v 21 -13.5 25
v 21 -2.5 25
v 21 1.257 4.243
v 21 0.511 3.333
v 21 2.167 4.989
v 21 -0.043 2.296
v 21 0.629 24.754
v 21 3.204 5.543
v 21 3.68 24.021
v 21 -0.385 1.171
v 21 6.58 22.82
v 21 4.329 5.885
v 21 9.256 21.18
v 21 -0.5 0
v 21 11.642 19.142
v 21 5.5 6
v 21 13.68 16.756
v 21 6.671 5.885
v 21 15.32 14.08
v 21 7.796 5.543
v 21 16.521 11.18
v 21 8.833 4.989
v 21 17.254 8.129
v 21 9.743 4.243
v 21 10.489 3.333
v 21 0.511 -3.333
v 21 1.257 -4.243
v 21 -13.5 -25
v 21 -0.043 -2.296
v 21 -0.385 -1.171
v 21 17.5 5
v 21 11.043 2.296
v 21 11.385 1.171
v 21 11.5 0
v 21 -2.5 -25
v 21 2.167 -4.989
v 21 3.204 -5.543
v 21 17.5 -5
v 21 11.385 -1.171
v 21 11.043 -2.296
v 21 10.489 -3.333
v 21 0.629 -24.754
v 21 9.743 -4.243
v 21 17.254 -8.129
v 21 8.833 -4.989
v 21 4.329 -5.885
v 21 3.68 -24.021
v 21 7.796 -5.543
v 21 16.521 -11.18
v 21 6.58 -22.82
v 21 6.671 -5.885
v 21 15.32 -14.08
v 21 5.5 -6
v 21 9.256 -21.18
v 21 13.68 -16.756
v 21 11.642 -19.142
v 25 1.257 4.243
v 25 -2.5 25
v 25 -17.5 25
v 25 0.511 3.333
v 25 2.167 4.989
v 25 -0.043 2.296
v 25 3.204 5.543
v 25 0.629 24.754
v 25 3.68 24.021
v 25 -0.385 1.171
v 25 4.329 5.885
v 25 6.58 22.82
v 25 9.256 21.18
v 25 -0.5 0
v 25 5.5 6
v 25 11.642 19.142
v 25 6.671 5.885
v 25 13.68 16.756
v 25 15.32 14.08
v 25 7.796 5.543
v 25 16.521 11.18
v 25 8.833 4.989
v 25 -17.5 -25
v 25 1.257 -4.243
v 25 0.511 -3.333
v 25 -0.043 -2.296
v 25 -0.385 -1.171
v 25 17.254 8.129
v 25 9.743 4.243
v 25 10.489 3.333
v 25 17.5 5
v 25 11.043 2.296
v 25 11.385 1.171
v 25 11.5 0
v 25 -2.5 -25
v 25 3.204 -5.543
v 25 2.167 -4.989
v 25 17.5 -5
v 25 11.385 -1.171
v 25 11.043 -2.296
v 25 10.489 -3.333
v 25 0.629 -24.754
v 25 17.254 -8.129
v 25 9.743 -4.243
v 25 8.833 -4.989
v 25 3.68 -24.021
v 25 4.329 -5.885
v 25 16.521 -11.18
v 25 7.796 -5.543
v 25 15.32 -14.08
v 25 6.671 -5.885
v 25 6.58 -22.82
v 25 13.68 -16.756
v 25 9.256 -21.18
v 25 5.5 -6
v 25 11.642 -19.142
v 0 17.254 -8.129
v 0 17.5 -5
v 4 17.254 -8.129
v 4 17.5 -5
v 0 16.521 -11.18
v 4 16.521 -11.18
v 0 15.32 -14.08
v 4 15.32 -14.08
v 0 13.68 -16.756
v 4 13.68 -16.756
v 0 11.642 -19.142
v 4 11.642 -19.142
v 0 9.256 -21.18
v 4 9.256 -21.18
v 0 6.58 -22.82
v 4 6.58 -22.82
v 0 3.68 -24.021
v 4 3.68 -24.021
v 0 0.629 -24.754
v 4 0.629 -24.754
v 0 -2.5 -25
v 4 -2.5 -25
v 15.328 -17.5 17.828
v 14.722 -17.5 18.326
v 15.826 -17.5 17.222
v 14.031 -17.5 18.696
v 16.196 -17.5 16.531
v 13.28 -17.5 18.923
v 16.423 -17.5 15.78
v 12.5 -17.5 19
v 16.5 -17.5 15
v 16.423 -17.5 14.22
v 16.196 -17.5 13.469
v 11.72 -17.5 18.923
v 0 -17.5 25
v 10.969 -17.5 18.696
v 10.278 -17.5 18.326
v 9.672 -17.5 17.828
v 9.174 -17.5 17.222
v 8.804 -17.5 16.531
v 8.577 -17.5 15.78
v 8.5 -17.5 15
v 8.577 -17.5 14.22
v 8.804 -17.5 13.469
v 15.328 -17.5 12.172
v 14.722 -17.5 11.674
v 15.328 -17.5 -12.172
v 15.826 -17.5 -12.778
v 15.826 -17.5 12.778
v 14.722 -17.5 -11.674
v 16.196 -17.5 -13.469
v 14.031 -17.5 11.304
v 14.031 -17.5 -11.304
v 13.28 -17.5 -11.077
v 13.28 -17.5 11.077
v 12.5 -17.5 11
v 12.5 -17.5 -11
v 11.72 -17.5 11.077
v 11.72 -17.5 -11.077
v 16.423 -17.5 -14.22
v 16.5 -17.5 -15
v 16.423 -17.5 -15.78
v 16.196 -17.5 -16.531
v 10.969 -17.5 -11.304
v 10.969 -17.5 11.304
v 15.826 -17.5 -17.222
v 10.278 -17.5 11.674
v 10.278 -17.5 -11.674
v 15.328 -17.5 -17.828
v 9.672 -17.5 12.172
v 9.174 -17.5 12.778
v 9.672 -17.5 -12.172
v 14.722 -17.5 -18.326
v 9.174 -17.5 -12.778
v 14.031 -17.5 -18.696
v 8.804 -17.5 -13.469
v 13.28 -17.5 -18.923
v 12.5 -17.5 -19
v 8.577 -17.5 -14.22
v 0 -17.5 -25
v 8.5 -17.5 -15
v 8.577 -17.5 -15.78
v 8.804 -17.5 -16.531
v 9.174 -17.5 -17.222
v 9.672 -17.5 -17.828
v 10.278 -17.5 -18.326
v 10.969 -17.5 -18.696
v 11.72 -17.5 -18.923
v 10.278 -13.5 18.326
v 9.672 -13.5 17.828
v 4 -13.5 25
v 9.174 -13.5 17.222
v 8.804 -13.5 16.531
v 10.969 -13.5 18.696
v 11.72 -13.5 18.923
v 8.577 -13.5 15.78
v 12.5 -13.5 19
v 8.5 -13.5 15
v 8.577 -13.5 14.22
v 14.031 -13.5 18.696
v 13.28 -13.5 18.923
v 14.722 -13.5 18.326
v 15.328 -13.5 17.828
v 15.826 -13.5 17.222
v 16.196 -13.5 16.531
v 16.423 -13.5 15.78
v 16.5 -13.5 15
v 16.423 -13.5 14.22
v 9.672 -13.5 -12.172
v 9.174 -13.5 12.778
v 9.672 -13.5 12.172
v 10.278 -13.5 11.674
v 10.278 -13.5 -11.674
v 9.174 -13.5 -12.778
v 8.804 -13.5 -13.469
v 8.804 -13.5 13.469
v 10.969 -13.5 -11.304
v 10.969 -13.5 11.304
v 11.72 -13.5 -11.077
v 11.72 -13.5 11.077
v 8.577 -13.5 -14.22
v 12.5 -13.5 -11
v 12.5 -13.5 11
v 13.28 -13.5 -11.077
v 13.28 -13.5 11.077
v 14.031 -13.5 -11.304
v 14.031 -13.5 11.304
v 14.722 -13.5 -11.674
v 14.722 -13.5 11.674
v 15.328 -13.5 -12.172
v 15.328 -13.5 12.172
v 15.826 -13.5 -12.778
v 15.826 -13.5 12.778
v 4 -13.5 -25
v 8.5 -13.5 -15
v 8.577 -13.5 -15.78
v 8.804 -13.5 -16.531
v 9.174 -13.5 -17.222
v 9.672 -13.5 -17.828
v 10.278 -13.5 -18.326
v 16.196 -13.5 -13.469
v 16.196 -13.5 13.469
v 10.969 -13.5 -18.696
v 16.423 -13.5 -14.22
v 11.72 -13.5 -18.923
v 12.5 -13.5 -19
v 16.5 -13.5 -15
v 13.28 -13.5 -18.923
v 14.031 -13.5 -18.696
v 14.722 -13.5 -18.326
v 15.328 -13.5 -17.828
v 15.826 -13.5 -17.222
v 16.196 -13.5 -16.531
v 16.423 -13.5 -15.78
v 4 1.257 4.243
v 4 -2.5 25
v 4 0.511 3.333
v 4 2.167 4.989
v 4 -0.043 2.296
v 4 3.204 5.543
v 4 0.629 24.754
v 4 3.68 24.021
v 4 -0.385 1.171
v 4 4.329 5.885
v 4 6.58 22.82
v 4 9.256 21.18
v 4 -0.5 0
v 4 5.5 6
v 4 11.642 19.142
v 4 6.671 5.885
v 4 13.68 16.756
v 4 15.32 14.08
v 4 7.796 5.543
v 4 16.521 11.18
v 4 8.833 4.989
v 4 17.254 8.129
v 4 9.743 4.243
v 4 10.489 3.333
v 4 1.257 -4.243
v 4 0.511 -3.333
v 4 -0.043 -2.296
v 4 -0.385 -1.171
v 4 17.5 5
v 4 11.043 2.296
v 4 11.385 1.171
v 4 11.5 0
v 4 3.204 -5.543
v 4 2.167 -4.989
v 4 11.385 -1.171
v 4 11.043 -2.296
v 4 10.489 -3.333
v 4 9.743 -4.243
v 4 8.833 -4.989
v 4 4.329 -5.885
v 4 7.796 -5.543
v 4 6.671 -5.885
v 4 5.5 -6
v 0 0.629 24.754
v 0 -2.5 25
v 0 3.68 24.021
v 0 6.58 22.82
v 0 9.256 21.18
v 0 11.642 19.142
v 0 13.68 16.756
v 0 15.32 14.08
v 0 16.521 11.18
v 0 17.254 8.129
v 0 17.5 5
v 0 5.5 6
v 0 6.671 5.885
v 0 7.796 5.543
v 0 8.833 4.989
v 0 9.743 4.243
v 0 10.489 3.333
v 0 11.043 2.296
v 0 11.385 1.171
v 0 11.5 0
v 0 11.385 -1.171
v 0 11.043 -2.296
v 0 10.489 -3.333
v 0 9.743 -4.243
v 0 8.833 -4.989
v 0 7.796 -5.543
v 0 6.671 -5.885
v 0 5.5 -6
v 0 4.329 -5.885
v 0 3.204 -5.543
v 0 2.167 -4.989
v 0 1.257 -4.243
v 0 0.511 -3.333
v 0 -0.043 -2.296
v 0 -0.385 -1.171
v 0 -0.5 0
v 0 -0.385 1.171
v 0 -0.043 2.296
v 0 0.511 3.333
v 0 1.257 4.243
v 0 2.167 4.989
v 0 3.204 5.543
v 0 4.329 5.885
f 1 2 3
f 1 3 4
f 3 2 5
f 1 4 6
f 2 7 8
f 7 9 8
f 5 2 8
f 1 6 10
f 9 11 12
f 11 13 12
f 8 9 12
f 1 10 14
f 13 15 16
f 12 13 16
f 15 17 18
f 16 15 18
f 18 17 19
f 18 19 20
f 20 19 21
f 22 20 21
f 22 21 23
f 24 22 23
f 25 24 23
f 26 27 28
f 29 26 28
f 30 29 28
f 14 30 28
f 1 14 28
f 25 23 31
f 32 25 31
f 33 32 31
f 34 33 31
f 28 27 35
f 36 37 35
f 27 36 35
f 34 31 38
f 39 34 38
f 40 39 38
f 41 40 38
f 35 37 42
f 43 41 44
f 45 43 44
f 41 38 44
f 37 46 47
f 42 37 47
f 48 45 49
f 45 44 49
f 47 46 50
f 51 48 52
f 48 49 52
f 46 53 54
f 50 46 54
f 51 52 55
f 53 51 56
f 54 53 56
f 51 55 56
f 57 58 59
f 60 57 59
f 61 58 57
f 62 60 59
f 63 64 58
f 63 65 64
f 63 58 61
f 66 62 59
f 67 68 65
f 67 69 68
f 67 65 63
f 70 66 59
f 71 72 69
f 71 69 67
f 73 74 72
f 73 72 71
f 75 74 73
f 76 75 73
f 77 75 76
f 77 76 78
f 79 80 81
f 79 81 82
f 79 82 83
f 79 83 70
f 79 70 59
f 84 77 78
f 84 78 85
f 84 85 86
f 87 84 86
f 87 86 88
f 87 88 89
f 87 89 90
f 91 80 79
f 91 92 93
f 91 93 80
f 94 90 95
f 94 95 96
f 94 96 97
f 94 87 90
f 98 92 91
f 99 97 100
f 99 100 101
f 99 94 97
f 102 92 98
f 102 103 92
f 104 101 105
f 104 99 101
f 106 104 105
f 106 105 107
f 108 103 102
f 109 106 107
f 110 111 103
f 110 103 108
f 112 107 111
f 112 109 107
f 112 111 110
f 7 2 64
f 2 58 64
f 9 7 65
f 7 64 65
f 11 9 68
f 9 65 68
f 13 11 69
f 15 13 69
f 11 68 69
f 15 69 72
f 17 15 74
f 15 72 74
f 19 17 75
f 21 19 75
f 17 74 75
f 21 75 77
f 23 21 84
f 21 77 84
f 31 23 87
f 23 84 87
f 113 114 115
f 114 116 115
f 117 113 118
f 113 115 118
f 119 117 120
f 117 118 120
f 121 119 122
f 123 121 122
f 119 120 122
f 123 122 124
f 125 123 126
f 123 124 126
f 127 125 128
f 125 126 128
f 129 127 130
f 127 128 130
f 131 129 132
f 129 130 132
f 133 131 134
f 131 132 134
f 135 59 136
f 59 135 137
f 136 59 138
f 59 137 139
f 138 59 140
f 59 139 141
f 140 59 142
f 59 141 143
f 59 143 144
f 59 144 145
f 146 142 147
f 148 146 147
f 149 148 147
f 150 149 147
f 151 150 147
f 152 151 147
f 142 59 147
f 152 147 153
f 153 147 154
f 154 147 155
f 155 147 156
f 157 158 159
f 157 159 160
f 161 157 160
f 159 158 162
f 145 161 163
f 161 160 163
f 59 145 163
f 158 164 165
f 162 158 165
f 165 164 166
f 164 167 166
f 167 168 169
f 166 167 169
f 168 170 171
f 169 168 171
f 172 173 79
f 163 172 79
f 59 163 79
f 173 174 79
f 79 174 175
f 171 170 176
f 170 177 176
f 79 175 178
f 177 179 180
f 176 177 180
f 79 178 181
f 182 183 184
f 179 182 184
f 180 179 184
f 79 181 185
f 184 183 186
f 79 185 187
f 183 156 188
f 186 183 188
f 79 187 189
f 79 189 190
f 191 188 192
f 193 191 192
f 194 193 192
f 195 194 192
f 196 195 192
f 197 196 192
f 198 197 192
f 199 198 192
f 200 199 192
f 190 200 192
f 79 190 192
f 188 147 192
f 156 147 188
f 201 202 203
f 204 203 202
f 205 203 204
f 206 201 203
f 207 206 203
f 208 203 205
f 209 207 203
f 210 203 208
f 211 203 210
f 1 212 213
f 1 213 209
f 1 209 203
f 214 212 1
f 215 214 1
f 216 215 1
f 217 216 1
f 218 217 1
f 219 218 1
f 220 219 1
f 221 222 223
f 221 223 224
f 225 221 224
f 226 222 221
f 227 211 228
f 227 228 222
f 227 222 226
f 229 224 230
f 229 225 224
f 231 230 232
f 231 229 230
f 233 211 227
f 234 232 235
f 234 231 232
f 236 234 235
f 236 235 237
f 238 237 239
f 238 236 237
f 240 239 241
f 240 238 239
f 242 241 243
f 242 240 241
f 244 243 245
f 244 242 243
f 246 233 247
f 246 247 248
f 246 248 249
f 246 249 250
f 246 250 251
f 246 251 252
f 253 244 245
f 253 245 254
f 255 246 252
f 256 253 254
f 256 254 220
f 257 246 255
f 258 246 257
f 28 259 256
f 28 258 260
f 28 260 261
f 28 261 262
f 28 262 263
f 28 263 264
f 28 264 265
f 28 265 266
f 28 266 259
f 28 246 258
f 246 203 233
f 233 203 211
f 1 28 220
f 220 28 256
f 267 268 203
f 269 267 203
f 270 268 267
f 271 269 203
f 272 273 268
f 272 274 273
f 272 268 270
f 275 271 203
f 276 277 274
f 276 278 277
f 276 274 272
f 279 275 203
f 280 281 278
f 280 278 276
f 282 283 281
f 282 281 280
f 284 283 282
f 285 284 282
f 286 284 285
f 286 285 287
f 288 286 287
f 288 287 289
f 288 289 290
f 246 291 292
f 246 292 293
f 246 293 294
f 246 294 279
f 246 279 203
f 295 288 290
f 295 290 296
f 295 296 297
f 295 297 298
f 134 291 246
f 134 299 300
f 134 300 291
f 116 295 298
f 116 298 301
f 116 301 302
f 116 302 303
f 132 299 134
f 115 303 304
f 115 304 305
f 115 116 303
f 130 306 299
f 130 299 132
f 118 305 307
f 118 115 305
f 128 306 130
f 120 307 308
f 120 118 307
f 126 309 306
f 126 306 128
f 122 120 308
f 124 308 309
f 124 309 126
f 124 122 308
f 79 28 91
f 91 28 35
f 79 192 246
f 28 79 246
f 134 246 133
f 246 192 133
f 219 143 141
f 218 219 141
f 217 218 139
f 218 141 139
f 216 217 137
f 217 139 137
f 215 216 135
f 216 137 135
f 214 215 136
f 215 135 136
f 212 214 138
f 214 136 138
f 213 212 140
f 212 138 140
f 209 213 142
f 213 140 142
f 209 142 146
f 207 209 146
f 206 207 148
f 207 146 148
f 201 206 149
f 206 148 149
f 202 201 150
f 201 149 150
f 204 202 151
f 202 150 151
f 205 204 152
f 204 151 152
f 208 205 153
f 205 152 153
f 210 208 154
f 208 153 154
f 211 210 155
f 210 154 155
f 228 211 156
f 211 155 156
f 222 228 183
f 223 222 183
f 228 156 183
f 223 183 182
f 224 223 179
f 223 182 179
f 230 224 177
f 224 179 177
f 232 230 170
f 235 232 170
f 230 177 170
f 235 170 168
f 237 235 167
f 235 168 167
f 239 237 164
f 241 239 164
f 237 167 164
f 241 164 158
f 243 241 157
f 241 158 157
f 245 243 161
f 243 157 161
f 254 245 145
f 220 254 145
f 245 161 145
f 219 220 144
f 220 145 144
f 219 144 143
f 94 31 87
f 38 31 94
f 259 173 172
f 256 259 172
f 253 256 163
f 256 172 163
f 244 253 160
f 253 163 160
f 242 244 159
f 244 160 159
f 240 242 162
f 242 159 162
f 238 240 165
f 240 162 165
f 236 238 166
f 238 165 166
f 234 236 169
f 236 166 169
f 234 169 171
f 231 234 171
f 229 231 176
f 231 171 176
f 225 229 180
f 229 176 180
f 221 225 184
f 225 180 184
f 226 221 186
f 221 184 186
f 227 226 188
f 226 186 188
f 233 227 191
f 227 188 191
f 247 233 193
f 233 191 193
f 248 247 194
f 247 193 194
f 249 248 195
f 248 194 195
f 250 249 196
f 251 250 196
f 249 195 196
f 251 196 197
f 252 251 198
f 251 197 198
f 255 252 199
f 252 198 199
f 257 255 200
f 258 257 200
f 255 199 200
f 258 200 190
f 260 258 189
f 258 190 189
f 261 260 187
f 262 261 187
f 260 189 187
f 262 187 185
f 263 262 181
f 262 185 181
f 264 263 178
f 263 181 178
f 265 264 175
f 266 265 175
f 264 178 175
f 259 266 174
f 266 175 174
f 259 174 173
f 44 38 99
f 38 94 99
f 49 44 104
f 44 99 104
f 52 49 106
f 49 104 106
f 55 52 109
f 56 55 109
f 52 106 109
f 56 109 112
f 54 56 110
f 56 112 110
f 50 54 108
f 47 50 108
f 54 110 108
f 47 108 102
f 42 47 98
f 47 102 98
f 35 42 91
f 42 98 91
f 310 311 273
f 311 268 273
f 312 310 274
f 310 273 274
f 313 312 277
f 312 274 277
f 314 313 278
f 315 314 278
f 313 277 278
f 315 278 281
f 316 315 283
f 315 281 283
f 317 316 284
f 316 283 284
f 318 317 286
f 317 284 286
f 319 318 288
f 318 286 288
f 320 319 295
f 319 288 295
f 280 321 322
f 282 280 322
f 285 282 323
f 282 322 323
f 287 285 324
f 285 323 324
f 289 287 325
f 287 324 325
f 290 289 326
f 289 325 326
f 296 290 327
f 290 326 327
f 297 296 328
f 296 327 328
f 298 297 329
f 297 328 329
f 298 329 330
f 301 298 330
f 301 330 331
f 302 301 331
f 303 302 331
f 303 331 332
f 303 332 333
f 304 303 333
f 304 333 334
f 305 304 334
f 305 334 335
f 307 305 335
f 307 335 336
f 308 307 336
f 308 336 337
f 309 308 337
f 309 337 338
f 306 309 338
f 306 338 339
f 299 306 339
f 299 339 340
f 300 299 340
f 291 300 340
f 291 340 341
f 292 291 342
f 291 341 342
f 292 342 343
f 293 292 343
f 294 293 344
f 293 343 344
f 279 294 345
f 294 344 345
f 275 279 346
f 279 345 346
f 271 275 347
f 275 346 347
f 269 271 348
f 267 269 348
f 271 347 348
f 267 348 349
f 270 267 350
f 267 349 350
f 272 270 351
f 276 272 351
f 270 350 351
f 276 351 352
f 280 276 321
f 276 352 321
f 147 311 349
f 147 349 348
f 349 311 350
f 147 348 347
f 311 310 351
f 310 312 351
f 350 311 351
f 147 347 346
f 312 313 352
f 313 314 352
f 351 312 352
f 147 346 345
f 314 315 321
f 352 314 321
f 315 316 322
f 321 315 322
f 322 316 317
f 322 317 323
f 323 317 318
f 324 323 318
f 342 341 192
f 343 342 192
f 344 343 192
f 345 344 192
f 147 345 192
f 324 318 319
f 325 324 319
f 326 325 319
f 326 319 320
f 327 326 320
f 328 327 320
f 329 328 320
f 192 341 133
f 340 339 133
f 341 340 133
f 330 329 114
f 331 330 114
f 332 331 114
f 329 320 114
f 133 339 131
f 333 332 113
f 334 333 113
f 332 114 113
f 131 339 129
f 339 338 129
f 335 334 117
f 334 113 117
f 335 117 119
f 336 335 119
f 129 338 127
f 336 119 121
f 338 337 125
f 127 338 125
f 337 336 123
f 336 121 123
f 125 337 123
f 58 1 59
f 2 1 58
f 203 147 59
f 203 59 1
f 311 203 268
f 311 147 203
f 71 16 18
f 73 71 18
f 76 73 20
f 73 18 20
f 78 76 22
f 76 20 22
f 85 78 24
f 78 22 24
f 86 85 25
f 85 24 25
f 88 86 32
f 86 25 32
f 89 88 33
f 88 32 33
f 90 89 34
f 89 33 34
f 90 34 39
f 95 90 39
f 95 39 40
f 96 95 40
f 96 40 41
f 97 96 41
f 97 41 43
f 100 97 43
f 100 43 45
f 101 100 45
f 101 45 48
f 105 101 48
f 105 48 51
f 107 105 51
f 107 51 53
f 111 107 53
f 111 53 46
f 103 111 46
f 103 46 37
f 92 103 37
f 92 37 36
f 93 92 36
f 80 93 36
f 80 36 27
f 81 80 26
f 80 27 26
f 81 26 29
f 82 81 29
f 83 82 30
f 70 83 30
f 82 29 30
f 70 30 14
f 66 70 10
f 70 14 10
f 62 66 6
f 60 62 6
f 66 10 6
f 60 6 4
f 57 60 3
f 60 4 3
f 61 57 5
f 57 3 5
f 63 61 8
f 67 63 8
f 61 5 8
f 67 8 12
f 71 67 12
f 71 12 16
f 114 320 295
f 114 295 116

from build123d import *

# Parameters (mm, degrees)
SKETCH1_W           = 50
SKETCH1_H           = 35
BOSS_EXTRUDE1_DEPTH = 25
SKETCH2_W           = 17
SKETCH2_H           = 50
CUT_EXTRUDE1_DEPTH  = 31
SKETCH4_R           = 6
CUT_EXTRUDE2_DEPTH  = 26
SKETCH5_R           = 4
CUT_EXTRUDE3_DEPTH  = 4
FILLET1_R           = 20


with BuildPart() as part:
    # Sketch1 → Boss-Extrude1 (new body)
    with BuildSketch(Plane(origin=(0, 0, 0), x_dir=(0, 0, -1), z_dir=(1, 0, 0))):
        Rectangle(SKETCH1_W, SKETCH1_H)
    extrude(amount=BOSS_EXTRUDE1_DEPTH)

    # Sketch2 → Cut-Extrude1 (cut)
    with BuildSketch(Plane(origin=(0, 17.5, 0), x_dir=(1, 0, 0), z_dir=(0, 1, 0))):
        with Locations((12.5, 0)):
            Rectangle(SKETCH2_W, SKETCH2_H)
    extrude(amount=-CUT_EXTRUDE1_DEPTH, mode=Mode.SUBTRACT)

    # Sketch4 → Cut-Extrude2 (cut, through all)
    with BuildSketch(Plane.ZY):
        with Locations((0, 5.5)):
            Circle(SKETCH4_R)
    extrude(amount=-CUT_EXTRUDE2_DEPTH, mode=Mode.SUBTRACT)

    # Sketch5 → Cut-Extrude3 (cut)
    with BuildSketch(Plane.XZ.offset(17.5)):
        with Locations((12.5, 15)):
            Circle(SKETCH5_R)
        with Locations((12.5, -15)):
            Circle(SKETCH5_R)
    extrude(amount=-CUT_EXTRUDE3_DEPTH, mode=Mode.SUBTRACT)

    # Fillet1
    fillet1_edges = [part.edges().sort_by_distance(p)[0] for p in [
        (2, 17.5, 25),
        (2, 17.5, -25),
        (23, 17.5, 25),
        (23, 17.5, -25),
    ]]
    fillet(fillet1_edges, radius=FILLET1_R)


solid = part.part
